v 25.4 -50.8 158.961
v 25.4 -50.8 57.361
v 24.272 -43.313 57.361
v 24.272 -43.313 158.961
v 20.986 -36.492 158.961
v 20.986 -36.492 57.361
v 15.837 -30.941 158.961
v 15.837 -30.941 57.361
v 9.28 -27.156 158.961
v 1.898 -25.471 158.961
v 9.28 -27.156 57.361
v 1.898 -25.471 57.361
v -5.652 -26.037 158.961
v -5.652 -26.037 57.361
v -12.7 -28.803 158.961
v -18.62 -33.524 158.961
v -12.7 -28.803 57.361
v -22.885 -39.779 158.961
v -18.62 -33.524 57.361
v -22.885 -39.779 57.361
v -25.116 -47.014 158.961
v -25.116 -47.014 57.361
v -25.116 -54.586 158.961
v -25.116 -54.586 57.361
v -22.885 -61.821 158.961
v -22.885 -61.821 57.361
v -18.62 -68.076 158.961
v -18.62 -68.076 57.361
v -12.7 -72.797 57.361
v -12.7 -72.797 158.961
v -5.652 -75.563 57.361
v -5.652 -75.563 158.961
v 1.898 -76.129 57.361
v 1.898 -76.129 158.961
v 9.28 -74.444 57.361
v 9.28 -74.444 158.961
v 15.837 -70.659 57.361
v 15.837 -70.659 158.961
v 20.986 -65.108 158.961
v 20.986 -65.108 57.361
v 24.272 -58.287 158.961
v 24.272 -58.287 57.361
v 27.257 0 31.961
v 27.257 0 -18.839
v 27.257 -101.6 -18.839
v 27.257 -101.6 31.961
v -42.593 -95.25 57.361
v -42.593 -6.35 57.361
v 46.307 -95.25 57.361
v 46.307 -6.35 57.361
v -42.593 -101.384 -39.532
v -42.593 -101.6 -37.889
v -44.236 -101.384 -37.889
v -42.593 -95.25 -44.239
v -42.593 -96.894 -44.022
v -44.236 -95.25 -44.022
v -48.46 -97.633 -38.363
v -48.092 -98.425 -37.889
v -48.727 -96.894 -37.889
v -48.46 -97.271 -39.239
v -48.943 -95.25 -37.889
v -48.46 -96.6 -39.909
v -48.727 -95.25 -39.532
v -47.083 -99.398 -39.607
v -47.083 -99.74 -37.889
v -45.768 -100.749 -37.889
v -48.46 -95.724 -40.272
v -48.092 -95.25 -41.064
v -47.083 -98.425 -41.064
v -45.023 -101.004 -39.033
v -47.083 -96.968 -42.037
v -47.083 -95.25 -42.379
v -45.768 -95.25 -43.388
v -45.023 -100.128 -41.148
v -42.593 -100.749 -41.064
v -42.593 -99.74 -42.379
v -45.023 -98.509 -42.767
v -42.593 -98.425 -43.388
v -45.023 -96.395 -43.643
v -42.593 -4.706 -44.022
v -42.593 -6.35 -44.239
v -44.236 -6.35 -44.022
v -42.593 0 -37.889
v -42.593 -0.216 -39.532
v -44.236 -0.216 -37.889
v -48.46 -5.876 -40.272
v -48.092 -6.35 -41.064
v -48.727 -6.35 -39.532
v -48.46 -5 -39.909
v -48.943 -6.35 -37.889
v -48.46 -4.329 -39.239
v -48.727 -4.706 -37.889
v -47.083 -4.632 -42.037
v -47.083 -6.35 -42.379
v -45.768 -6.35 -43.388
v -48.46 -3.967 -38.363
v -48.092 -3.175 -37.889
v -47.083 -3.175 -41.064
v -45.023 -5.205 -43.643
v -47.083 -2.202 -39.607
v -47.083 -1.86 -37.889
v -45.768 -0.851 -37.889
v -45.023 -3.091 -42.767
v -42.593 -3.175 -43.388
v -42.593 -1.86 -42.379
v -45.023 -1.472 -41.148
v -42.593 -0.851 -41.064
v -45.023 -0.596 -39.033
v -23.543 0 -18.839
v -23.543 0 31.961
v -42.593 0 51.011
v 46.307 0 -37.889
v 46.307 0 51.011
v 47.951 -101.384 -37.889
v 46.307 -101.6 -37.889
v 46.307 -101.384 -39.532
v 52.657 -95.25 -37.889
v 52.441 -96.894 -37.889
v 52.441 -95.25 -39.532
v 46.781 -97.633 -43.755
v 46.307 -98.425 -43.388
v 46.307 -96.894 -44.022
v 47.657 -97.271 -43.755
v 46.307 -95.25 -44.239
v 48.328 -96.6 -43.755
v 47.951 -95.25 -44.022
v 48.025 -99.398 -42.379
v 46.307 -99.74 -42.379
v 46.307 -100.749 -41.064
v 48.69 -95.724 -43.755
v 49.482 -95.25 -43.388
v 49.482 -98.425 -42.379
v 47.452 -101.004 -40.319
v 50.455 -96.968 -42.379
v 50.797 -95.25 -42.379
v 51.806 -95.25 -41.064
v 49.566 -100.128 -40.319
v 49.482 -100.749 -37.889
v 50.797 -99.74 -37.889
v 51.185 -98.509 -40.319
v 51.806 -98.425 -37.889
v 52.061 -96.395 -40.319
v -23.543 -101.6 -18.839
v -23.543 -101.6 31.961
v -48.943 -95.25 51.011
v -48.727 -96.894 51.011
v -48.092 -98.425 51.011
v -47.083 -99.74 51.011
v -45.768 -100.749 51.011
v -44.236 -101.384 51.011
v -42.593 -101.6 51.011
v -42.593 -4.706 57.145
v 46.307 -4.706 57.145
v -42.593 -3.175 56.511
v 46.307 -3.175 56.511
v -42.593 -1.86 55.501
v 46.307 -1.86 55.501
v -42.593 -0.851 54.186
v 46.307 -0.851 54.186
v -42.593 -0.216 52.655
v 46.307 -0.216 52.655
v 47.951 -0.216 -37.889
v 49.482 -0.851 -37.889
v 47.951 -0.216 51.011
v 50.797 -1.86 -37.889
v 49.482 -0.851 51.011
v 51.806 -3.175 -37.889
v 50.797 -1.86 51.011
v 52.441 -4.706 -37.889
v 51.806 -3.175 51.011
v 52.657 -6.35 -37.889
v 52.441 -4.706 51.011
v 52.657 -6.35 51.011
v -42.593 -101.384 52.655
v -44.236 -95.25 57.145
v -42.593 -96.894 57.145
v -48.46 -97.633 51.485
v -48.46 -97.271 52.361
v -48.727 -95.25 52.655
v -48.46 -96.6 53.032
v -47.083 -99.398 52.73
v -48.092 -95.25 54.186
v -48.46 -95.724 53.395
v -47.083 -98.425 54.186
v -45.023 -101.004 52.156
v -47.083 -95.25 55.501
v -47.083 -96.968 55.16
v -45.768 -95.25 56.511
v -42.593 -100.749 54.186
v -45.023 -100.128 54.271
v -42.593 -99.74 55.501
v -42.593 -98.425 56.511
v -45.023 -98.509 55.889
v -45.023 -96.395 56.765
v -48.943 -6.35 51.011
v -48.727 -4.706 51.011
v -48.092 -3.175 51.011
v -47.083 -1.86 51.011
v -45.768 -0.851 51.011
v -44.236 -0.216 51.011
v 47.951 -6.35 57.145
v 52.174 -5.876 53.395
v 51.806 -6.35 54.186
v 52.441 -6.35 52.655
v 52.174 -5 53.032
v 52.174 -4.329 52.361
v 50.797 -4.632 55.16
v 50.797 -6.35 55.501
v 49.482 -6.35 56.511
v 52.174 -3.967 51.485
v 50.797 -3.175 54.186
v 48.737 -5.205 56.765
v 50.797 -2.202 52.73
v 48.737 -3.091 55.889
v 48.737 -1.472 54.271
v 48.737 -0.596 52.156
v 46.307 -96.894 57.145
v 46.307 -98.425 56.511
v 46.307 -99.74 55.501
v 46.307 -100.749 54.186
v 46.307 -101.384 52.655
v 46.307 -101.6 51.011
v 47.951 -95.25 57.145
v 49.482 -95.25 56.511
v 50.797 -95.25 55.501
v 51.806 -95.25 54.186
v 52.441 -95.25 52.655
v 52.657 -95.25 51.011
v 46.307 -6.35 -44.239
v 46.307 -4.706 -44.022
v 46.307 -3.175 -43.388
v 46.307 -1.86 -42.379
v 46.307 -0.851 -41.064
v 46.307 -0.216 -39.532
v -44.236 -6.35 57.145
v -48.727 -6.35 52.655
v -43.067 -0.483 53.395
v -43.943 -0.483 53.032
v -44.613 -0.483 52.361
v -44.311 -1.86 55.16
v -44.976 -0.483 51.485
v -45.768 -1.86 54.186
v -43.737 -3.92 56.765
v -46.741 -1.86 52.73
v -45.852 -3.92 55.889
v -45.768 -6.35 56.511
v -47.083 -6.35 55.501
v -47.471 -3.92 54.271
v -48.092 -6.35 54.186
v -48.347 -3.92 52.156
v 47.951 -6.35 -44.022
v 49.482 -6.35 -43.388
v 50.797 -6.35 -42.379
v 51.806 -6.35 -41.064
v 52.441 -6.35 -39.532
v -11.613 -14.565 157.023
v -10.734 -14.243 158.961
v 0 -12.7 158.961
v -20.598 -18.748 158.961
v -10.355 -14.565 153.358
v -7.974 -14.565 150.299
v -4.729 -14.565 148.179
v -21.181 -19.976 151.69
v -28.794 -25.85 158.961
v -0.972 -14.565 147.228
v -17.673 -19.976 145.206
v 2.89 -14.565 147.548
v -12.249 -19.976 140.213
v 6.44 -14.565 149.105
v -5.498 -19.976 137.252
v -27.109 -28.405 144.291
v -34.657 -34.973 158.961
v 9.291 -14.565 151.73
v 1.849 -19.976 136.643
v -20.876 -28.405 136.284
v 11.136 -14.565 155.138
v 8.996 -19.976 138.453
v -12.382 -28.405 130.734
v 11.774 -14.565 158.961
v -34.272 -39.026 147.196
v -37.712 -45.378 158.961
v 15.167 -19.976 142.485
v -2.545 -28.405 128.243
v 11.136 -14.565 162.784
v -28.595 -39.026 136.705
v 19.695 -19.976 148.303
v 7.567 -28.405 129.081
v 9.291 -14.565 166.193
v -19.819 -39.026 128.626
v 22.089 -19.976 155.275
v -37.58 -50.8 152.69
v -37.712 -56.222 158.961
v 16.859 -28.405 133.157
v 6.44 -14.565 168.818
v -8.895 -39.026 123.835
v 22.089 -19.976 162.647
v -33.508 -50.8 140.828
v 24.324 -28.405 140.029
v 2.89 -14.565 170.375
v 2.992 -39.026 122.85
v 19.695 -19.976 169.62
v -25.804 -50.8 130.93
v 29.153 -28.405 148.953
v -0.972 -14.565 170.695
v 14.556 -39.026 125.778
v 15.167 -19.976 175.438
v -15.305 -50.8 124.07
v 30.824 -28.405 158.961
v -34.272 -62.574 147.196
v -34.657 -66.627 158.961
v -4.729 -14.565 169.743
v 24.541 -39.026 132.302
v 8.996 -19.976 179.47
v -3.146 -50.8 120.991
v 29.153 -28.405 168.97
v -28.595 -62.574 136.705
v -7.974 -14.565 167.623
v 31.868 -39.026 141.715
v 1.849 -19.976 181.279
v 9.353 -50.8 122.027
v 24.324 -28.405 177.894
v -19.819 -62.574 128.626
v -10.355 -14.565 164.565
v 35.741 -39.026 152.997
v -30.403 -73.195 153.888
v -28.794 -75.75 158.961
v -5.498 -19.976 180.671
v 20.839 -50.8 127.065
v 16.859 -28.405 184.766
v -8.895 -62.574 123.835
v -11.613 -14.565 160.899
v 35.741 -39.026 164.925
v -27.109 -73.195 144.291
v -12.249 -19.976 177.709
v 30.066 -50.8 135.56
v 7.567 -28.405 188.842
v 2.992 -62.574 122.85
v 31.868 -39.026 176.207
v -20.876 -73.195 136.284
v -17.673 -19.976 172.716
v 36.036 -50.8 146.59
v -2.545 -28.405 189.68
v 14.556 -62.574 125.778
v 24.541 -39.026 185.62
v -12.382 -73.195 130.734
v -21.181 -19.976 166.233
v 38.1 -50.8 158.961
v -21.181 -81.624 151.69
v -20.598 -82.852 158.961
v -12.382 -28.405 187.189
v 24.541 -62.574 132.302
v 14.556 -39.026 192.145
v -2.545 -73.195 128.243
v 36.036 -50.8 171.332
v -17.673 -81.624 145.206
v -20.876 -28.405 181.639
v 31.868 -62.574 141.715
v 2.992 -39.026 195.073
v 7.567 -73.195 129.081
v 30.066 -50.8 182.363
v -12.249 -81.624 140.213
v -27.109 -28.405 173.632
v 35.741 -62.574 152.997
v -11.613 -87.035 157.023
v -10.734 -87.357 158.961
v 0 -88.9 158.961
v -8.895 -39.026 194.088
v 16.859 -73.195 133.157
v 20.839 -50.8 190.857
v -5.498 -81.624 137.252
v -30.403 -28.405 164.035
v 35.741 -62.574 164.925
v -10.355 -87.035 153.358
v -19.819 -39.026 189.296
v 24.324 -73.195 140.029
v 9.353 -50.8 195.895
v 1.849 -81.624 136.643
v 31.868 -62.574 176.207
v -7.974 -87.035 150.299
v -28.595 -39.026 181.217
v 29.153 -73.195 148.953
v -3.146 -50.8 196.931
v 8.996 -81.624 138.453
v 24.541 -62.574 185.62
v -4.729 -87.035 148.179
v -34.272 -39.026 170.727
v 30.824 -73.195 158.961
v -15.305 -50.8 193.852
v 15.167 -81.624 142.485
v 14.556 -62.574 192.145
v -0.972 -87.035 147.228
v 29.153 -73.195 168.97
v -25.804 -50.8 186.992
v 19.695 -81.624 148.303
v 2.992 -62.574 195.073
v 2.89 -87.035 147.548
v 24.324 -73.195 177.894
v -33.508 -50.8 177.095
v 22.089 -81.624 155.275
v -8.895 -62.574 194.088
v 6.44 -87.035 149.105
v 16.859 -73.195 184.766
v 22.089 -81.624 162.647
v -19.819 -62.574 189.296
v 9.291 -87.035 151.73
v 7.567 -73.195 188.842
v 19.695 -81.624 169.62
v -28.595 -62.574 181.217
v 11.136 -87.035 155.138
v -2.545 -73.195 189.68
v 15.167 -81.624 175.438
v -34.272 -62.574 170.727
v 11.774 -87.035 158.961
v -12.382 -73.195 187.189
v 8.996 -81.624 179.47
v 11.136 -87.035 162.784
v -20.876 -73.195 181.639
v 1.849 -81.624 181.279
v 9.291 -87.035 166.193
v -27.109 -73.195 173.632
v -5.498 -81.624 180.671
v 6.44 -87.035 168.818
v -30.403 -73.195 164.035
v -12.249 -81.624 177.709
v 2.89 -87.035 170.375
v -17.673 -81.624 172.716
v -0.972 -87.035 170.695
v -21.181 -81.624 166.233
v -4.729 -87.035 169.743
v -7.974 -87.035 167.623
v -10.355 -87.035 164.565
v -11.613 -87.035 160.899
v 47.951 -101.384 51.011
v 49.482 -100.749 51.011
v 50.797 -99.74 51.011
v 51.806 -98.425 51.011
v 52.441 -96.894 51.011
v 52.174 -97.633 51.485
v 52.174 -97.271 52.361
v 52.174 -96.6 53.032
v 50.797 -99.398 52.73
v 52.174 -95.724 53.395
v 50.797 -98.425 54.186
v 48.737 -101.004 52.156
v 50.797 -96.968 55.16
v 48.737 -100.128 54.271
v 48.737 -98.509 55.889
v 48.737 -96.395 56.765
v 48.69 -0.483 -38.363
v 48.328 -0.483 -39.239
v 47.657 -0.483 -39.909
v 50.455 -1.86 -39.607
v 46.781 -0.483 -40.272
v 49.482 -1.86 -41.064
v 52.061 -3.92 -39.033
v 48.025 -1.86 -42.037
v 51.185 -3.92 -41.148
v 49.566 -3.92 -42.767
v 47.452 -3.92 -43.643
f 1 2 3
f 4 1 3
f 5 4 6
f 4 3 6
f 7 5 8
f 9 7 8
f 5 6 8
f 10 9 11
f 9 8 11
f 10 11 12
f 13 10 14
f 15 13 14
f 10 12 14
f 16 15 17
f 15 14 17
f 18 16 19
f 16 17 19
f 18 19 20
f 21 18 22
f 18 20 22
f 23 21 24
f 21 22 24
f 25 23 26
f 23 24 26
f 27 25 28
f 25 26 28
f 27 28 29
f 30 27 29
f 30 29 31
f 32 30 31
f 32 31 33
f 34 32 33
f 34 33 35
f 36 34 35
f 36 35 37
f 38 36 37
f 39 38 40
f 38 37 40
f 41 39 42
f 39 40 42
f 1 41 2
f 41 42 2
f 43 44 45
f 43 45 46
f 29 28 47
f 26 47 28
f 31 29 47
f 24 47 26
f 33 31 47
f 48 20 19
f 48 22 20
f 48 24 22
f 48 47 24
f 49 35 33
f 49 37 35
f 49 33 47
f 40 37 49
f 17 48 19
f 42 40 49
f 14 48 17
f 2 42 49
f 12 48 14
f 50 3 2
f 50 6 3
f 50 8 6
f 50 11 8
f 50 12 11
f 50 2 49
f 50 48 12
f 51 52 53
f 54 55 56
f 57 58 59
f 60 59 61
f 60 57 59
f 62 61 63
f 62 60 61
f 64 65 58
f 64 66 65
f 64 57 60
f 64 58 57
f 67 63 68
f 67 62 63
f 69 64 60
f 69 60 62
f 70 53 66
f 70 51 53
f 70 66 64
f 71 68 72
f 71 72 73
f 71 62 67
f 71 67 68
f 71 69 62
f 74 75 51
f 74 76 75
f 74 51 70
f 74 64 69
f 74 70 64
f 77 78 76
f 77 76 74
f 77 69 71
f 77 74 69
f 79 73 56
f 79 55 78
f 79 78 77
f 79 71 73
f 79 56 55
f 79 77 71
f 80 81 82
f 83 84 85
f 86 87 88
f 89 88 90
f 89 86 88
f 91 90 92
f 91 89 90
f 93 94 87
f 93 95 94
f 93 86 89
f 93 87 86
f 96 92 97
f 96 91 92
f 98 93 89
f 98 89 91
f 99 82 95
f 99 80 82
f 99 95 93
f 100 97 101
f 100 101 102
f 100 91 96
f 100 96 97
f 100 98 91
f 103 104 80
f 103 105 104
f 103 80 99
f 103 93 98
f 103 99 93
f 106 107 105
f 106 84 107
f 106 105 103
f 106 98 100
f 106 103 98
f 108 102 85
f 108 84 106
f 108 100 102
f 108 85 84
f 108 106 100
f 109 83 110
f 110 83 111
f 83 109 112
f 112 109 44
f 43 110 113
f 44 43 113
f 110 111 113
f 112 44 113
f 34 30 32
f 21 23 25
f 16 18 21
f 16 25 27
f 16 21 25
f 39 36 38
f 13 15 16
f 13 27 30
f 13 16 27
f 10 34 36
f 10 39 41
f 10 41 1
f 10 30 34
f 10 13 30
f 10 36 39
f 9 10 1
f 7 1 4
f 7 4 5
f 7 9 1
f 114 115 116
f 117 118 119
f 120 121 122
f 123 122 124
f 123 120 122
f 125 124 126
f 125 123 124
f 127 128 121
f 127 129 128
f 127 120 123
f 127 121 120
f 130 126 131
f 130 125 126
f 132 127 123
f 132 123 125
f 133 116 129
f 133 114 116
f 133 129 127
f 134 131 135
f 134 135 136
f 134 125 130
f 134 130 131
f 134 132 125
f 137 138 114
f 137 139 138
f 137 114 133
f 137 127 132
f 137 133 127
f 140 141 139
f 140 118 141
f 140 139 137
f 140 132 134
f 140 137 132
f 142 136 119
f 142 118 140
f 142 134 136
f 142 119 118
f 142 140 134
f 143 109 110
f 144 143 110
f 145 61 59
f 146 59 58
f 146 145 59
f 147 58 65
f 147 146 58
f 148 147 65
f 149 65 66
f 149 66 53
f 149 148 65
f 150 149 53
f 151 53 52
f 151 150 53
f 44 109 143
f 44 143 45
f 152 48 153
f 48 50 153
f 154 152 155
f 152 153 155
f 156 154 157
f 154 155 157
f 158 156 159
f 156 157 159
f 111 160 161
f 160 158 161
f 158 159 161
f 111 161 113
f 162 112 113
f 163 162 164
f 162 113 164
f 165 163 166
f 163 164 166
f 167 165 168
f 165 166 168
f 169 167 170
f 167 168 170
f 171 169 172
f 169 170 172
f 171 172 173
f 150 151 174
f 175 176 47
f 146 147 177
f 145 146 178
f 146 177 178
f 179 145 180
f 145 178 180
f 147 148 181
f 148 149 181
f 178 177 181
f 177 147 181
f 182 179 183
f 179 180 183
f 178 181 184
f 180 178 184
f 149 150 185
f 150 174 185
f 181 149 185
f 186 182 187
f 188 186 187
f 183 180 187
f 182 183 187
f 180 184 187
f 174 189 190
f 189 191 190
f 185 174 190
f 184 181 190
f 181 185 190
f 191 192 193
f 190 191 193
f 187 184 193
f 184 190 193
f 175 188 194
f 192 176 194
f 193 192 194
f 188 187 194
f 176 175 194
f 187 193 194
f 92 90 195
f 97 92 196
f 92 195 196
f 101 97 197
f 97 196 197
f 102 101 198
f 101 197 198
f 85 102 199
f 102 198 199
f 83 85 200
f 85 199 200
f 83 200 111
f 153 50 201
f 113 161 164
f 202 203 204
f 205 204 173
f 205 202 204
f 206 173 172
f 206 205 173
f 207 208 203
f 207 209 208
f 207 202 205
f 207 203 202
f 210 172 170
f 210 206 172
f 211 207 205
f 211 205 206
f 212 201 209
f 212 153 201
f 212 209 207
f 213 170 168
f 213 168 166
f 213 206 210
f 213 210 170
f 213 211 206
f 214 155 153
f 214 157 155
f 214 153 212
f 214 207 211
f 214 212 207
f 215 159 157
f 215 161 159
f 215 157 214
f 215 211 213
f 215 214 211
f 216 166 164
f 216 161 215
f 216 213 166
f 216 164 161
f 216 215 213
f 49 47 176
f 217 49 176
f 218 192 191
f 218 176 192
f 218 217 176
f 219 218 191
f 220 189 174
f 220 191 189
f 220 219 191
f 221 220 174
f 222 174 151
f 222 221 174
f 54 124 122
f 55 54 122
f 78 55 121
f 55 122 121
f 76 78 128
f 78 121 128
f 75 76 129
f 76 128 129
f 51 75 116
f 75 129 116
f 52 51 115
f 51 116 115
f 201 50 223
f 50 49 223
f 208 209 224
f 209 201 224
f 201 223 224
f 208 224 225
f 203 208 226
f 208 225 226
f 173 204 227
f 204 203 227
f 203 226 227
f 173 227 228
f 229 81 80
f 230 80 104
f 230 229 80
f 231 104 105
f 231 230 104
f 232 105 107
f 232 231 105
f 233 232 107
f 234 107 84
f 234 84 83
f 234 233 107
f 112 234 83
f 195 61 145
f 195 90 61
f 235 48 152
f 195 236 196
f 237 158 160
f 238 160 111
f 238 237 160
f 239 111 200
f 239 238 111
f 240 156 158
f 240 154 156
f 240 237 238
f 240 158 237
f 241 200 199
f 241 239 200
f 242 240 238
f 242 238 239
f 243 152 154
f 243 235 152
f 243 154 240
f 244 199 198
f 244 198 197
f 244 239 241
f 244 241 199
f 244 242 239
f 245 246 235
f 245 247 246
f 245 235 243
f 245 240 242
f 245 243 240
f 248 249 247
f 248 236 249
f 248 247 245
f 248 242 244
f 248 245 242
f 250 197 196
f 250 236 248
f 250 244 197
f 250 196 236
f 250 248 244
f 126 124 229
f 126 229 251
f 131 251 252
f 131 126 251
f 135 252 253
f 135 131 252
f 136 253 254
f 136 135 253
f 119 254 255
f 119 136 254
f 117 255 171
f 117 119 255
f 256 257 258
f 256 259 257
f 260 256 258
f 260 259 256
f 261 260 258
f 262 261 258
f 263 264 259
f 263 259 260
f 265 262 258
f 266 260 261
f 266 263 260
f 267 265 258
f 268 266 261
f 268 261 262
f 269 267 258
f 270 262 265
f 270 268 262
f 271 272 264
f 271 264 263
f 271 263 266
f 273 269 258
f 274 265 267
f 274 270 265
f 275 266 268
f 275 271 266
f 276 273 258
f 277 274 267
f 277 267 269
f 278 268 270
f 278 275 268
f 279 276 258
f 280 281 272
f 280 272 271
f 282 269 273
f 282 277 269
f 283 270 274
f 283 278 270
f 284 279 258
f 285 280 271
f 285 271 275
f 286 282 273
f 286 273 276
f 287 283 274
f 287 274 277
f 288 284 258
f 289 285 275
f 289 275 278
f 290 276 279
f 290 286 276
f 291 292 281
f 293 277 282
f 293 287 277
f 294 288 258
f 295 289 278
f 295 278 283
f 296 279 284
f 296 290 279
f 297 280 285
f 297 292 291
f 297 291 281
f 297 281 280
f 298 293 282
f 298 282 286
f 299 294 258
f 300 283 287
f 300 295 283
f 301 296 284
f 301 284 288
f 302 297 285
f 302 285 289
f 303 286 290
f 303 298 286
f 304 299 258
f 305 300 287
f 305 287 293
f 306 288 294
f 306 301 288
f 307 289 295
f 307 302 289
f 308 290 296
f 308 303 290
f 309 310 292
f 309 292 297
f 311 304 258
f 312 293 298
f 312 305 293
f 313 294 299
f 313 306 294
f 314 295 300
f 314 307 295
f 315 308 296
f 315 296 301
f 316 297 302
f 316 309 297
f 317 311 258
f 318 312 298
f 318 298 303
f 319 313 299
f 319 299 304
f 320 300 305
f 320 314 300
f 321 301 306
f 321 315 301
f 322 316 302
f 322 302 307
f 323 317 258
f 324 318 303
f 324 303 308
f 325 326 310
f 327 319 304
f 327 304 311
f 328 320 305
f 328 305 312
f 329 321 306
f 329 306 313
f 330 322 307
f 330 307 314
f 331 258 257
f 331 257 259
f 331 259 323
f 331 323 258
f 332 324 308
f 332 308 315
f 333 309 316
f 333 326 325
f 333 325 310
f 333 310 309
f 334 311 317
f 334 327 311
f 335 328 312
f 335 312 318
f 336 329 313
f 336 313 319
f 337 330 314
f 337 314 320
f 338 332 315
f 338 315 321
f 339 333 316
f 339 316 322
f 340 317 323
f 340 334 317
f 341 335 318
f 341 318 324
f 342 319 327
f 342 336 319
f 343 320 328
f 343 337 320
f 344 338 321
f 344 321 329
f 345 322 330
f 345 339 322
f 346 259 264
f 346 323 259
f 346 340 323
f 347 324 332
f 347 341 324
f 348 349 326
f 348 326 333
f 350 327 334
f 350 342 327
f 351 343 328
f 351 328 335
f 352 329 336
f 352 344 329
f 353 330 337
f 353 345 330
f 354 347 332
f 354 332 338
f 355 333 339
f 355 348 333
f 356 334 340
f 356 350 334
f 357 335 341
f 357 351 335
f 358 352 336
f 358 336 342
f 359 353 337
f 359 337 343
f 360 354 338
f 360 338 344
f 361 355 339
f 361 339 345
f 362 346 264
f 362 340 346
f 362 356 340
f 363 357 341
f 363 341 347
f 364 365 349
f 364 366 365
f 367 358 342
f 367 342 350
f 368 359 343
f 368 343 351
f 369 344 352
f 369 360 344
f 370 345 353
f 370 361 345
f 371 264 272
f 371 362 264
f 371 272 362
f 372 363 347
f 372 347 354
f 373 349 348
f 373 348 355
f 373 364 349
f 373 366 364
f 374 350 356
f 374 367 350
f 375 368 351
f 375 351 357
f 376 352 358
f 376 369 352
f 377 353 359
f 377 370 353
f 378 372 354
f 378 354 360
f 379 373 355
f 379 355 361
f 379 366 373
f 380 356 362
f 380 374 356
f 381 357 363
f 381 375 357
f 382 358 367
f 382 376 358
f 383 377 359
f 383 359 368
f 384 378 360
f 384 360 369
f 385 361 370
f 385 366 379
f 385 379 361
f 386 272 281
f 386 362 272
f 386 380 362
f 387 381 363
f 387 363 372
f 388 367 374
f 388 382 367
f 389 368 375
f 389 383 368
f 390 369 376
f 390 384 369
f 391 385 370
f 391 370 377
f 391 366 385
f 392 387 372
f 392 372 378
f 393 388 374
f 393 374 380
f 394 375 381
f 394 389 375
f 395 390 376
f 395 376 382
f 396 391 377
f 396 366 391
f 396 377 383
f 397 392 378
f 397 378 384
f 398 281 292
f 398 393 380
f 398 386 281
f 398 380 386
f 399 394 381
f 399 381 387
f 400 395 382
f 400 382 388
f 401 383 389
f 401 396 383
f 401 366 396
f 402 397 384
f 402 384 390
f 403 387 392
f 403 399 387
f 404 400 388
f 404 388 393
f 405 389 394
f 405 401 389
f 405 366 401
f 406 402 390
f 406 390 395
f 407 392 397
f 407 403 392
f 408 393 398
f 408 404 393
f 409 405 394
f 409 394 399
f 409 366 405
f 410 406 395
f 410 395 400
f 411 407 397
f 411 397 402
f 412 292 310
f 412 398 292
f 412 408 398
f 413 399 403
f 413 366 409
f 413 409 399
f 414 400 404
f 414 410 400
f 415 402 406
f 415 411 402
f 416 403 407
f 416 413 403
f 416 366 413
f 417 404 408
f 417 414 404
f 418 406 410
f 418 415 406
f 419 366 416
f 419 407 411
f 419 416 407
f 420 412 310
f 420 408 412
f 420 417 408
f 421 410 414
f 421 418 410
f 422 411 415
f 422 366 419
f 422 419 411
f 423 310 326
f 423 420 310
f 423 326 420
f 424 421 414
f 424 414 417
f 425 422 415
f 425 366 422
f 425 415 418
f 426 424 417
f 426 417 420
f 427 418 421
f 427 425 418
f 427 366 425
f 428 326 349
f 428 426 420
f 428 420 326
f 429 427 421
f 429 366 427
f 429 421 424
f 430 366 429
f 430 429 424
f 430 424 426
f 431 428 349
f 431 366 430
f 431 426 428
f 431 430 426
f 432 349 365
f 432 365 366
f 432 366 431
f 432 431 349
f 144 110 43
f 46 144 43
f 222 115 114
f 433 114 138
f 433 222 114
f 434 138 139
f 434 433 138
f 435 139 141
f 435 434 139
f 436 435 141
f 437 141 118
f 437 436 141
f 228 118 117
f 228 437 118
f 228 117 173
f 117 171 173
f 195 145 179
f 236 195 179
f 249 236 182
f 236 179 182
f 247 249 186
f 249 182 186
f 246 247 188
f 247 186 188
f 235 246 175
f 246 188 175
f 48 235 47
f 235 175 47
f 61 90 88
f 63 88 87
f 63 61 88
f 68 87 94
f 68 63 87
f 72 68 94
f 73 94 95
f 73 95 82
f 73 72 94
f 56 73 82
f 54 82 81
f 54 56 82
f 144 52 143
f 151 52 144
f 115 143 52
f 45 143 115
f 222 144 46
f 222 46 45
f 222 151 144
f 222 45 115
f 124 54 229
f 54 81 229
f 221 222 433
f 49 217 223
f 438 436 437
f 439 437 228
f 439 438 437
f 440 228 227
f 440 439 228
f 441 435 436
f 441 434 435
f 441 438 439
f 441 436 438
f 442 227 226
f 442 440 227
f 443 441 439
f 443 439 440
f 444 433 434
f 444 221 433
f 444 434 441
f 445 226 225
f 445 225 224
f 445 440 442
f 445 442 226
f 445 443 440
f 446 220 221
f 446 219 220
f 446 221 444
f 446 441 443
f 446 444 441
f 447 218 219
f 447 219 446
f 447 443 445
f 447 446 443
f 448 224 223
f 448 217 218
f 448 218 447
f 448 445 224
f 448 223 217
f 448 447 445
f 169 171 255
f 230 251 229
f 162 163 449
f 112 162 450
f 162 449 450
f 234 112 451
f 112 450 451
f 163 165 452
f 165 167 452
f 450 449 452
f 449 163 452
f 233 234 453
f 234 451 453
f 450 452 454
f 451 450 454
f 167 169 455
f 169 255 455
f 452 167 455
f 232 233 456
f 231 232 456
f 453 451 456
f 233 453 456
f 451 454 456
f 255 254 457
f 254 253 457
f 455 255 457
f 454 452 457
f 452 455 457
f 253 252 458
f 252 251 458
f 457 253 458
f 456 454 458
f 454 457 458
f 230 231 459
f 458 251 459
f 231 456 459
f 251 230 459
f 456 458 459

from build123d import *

# Parameters (mm, degrees)
F0_W     = 101.6
F0_H     = 101.6
F1_DEPTH = 101.6
F2_R     = 25.4
F3_DEPTH = 101.6
F6_W     = 50.8
F6_H     = 50.8
F7_DEPTH = 101.6
F8_R     = 6.35


# Not quite as in the source:
# - a feature names something its author has since deleted; it is built from what else it names


with BuildPart() as f1:
    # F0 (on Front) → F1 (new body)
    with BuildSketch(Plane.XZ):
        with Locations((1.857098192, 6.5613021186)):
            Rectangle(F0_W, F0_H)
    extrude(amount=F1_DEPTH)

    # F2 (on face) → F3 (join)
    with BuildSketch(Plane.XY.offset(57.3613021186)):
        with Locations((0, -50.8)):
            Circle(F2_R)
    extrude(amount=F3_DEPTH)

    # F6 (on face) → F7 (cut)
    with BuildSketch(Plane.XZ.offset(101.6)):
        with Locations((1.857098192, 6.5613021186)):
            Rectangle(F6_W, F6_H)
    extrude(amount=-F7_DEPTH, mode=Mode.SUBTRACT)

    # F8
    f8_edges = [f1.edges().sort_by_distance(p)[0] for p in [
        (1.857098, -101.6, 57.361302),
        (52.657098, -101.6, 6.561302),
        (1.857098, -101.6, -44.238698),
        (-48.942902, -101.6, 6.561302),
        (-48.942902, -50.8, 57.361302),
        (1.857098, 0, 57.361302),
        (52.657098, -50.8, 57.361302),
        (52.657098, -50.8, -44.238698),
        (52.657098, 0, 6.561302),
        (1.857098, 0, -44.238698),
        (-48.942902, -50.8, -44.238698),
        (-48.942902, 0, 6.561302),
    ]]
    fillet(f8_edges, radius=F8_R)


with BuildPart() as f5:
    # F4 (on face) → F5 (revolve)
    with BuildSketch(Plane.XY.offset(158.9613021186)):
        with BuildLine():
            Line((0, -25.4), (0, -12.7))
            ThreePointArc((0, -12.7), (-38.1, -50.8), (0, -88.9))
            Line((0, -88.9), (0, -76.2))
            ThreePointArc((0, -76.2), (-25.4, -50.8), (0, -25.4))
        make_face()
        with BuildLine():
            Line((0, -76.2), (0, -25.4))
            ThreePointArc((0, -25.4), (-25.4, -50.8), (0, -76.2))
        make_face()
    revolve(axis=Axis((0, -50.8, 158.9613021186), (0, -1, 0)))


solid = Compound([f1.part, f5.part])
